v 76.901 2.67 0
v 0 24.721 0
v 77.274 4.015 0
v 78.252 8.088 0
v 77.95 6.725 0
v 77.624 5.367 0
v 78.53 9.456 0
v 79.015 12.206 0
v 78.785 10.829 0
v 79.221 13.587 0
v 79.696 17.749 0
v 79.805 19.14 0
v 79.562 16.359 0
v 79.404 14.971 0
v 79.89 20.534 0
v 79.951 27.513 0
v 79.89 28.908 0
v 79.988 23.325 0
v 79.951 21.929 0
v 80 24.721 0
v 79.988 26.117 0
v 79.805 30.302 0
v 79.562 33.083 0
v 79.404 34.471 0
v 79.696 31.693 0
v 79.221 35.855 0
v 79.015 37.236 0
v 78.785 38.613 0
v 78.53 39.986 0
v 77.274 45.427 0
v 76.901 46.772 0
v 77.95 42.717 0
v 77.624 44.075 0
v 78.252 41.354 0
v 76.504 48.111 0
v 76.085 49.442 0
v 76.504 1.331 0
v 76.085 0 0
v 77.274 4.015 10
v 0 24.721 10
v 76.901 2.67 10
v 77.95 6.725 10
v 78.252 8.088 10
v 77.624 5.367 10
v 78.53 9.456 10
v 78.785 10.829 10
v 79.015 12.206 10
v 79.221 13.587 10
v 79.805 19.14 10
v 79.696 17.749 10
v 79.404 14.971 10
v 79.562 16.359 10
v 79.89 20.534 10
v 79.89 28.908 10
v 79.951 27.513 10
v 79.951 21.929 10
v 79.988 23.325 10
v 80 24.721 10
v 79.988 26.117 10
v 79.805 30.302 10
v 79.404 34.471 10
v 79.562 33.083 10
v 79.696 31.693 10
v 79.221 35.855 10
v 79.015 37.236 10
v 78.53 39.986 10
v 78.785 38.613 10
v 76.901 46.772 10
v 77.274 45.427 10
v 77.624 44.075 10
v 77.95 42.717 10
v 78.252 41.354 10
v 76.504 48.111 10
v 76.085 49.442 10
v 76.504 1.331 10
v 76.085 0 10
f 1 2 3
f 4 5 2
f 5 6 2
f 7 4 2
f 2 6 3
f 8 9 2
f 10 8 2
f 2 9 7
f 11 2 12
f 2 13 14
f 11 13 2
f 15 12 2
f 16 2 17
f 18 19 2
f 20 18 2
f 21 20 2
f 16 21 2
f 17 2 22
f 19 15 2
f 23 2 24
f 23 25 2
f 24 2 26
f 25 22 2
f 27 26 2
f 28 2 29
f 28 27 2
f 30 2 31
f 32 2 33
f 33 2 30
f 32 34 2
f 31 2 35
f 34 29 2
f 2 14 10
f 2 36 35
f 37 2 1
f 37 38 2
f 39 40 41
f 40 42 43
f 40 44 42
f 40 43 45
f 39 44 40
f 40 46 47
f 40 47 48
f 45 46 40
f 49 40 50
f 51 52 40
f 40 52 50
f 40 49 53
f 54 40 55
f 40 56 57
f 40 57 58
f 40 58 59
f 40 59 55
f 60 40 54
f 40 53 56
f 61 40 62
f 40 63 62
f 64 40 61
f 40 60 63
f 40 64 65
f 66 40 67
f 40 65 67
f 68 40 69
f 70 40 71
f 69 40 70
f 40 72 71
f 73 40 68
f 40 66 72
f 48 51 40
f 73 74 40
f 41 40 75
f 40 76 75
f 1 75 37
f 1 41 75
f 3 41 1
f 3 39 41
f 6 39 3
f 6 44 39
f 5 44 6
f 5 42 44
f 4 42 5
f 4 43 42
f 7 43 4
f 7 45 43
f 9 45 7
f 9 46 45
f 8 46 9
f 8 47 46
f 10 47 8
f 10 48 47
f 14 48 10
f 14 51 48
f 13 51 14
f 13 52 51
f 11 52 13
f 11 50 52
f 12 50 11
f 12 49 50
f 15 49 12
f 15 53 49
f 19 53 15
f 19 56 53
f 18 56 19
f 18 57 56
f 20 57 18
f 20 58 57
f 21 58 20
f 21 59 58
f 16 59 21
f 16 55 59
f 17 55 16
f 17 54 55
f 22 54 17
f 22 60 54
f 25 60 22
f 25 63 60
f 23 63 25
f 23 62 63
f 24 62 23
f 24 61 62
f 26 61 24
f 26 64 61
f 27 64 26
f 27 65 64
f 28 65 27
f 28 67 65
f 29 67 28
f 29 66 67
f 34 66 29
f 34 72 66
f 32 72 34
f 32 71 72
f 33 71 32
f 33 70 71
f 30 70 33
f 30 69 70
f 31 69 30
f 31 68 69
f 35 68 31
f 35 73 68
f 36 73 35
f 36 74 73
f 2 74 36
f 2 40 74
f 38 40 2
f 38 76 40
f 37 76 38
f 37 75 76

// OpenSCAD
$fn = 32;

// ----------------------------------------------------------------------
// Arc profile plate: sector, 38 points
// ----------------------------------------------------------------------

// --- parameters (mm) ---
sector_angle = 36;        // sector angle, degrees
sector_r = 80;            // outer radius
arc_step = 1;             // sampling step of the arc, degrees
plate_t = 10;             // plate thickness, Z
fit_tol = 0.02;           // declared fit tolerance (prompt contract)
free_tol = 0.2;           // declared free tolerance (prompt contract)

bbox_x = 2 * sector_r * sin(sector_angle / 2);  // chord of the sector
bbox_y = sector_r;  // depth of the sector (apex to arc)

profile = [[76.085, 0], [76.504, 1.331], [76.901, 2.67], [77.274, 4.015], [77.624, 5.367], [77.95, 6.725], [78.252, 8.088], [78.53, 9.456], [78.785, 10.829], [79.015, 12.206], [79.221, 13.587], [79.404, 14.971], [79.562, 16.359], [79.696, 17.749], [79.805, 19.14], [79.89, 20.534], [79.951, 21.929], [79.988, 23.325], [80, 24.721], [79.988, 26.117], [79.951, 27.513], [79.89, 28.908], [79.805, 30.302], [79.696, 31.693], [79.562, 33.083], [79.404, 34.471], [79.221, 35.855], [79.015, 37.236], [78.785, 38.613], [78.53, 39.986], [78.252, 41.354], [77.95, 42.717], [77.624, 44.075], [77.274, 45.427], [76.901, 46.772], [76.504, 48.111], [76.085, 49.442], [0, 24.721]];  // primary outline, 38 points, counter clockwise

// --- the one profile operation ---
linear_extrude(height = plate_t) polygon(points = profile);
